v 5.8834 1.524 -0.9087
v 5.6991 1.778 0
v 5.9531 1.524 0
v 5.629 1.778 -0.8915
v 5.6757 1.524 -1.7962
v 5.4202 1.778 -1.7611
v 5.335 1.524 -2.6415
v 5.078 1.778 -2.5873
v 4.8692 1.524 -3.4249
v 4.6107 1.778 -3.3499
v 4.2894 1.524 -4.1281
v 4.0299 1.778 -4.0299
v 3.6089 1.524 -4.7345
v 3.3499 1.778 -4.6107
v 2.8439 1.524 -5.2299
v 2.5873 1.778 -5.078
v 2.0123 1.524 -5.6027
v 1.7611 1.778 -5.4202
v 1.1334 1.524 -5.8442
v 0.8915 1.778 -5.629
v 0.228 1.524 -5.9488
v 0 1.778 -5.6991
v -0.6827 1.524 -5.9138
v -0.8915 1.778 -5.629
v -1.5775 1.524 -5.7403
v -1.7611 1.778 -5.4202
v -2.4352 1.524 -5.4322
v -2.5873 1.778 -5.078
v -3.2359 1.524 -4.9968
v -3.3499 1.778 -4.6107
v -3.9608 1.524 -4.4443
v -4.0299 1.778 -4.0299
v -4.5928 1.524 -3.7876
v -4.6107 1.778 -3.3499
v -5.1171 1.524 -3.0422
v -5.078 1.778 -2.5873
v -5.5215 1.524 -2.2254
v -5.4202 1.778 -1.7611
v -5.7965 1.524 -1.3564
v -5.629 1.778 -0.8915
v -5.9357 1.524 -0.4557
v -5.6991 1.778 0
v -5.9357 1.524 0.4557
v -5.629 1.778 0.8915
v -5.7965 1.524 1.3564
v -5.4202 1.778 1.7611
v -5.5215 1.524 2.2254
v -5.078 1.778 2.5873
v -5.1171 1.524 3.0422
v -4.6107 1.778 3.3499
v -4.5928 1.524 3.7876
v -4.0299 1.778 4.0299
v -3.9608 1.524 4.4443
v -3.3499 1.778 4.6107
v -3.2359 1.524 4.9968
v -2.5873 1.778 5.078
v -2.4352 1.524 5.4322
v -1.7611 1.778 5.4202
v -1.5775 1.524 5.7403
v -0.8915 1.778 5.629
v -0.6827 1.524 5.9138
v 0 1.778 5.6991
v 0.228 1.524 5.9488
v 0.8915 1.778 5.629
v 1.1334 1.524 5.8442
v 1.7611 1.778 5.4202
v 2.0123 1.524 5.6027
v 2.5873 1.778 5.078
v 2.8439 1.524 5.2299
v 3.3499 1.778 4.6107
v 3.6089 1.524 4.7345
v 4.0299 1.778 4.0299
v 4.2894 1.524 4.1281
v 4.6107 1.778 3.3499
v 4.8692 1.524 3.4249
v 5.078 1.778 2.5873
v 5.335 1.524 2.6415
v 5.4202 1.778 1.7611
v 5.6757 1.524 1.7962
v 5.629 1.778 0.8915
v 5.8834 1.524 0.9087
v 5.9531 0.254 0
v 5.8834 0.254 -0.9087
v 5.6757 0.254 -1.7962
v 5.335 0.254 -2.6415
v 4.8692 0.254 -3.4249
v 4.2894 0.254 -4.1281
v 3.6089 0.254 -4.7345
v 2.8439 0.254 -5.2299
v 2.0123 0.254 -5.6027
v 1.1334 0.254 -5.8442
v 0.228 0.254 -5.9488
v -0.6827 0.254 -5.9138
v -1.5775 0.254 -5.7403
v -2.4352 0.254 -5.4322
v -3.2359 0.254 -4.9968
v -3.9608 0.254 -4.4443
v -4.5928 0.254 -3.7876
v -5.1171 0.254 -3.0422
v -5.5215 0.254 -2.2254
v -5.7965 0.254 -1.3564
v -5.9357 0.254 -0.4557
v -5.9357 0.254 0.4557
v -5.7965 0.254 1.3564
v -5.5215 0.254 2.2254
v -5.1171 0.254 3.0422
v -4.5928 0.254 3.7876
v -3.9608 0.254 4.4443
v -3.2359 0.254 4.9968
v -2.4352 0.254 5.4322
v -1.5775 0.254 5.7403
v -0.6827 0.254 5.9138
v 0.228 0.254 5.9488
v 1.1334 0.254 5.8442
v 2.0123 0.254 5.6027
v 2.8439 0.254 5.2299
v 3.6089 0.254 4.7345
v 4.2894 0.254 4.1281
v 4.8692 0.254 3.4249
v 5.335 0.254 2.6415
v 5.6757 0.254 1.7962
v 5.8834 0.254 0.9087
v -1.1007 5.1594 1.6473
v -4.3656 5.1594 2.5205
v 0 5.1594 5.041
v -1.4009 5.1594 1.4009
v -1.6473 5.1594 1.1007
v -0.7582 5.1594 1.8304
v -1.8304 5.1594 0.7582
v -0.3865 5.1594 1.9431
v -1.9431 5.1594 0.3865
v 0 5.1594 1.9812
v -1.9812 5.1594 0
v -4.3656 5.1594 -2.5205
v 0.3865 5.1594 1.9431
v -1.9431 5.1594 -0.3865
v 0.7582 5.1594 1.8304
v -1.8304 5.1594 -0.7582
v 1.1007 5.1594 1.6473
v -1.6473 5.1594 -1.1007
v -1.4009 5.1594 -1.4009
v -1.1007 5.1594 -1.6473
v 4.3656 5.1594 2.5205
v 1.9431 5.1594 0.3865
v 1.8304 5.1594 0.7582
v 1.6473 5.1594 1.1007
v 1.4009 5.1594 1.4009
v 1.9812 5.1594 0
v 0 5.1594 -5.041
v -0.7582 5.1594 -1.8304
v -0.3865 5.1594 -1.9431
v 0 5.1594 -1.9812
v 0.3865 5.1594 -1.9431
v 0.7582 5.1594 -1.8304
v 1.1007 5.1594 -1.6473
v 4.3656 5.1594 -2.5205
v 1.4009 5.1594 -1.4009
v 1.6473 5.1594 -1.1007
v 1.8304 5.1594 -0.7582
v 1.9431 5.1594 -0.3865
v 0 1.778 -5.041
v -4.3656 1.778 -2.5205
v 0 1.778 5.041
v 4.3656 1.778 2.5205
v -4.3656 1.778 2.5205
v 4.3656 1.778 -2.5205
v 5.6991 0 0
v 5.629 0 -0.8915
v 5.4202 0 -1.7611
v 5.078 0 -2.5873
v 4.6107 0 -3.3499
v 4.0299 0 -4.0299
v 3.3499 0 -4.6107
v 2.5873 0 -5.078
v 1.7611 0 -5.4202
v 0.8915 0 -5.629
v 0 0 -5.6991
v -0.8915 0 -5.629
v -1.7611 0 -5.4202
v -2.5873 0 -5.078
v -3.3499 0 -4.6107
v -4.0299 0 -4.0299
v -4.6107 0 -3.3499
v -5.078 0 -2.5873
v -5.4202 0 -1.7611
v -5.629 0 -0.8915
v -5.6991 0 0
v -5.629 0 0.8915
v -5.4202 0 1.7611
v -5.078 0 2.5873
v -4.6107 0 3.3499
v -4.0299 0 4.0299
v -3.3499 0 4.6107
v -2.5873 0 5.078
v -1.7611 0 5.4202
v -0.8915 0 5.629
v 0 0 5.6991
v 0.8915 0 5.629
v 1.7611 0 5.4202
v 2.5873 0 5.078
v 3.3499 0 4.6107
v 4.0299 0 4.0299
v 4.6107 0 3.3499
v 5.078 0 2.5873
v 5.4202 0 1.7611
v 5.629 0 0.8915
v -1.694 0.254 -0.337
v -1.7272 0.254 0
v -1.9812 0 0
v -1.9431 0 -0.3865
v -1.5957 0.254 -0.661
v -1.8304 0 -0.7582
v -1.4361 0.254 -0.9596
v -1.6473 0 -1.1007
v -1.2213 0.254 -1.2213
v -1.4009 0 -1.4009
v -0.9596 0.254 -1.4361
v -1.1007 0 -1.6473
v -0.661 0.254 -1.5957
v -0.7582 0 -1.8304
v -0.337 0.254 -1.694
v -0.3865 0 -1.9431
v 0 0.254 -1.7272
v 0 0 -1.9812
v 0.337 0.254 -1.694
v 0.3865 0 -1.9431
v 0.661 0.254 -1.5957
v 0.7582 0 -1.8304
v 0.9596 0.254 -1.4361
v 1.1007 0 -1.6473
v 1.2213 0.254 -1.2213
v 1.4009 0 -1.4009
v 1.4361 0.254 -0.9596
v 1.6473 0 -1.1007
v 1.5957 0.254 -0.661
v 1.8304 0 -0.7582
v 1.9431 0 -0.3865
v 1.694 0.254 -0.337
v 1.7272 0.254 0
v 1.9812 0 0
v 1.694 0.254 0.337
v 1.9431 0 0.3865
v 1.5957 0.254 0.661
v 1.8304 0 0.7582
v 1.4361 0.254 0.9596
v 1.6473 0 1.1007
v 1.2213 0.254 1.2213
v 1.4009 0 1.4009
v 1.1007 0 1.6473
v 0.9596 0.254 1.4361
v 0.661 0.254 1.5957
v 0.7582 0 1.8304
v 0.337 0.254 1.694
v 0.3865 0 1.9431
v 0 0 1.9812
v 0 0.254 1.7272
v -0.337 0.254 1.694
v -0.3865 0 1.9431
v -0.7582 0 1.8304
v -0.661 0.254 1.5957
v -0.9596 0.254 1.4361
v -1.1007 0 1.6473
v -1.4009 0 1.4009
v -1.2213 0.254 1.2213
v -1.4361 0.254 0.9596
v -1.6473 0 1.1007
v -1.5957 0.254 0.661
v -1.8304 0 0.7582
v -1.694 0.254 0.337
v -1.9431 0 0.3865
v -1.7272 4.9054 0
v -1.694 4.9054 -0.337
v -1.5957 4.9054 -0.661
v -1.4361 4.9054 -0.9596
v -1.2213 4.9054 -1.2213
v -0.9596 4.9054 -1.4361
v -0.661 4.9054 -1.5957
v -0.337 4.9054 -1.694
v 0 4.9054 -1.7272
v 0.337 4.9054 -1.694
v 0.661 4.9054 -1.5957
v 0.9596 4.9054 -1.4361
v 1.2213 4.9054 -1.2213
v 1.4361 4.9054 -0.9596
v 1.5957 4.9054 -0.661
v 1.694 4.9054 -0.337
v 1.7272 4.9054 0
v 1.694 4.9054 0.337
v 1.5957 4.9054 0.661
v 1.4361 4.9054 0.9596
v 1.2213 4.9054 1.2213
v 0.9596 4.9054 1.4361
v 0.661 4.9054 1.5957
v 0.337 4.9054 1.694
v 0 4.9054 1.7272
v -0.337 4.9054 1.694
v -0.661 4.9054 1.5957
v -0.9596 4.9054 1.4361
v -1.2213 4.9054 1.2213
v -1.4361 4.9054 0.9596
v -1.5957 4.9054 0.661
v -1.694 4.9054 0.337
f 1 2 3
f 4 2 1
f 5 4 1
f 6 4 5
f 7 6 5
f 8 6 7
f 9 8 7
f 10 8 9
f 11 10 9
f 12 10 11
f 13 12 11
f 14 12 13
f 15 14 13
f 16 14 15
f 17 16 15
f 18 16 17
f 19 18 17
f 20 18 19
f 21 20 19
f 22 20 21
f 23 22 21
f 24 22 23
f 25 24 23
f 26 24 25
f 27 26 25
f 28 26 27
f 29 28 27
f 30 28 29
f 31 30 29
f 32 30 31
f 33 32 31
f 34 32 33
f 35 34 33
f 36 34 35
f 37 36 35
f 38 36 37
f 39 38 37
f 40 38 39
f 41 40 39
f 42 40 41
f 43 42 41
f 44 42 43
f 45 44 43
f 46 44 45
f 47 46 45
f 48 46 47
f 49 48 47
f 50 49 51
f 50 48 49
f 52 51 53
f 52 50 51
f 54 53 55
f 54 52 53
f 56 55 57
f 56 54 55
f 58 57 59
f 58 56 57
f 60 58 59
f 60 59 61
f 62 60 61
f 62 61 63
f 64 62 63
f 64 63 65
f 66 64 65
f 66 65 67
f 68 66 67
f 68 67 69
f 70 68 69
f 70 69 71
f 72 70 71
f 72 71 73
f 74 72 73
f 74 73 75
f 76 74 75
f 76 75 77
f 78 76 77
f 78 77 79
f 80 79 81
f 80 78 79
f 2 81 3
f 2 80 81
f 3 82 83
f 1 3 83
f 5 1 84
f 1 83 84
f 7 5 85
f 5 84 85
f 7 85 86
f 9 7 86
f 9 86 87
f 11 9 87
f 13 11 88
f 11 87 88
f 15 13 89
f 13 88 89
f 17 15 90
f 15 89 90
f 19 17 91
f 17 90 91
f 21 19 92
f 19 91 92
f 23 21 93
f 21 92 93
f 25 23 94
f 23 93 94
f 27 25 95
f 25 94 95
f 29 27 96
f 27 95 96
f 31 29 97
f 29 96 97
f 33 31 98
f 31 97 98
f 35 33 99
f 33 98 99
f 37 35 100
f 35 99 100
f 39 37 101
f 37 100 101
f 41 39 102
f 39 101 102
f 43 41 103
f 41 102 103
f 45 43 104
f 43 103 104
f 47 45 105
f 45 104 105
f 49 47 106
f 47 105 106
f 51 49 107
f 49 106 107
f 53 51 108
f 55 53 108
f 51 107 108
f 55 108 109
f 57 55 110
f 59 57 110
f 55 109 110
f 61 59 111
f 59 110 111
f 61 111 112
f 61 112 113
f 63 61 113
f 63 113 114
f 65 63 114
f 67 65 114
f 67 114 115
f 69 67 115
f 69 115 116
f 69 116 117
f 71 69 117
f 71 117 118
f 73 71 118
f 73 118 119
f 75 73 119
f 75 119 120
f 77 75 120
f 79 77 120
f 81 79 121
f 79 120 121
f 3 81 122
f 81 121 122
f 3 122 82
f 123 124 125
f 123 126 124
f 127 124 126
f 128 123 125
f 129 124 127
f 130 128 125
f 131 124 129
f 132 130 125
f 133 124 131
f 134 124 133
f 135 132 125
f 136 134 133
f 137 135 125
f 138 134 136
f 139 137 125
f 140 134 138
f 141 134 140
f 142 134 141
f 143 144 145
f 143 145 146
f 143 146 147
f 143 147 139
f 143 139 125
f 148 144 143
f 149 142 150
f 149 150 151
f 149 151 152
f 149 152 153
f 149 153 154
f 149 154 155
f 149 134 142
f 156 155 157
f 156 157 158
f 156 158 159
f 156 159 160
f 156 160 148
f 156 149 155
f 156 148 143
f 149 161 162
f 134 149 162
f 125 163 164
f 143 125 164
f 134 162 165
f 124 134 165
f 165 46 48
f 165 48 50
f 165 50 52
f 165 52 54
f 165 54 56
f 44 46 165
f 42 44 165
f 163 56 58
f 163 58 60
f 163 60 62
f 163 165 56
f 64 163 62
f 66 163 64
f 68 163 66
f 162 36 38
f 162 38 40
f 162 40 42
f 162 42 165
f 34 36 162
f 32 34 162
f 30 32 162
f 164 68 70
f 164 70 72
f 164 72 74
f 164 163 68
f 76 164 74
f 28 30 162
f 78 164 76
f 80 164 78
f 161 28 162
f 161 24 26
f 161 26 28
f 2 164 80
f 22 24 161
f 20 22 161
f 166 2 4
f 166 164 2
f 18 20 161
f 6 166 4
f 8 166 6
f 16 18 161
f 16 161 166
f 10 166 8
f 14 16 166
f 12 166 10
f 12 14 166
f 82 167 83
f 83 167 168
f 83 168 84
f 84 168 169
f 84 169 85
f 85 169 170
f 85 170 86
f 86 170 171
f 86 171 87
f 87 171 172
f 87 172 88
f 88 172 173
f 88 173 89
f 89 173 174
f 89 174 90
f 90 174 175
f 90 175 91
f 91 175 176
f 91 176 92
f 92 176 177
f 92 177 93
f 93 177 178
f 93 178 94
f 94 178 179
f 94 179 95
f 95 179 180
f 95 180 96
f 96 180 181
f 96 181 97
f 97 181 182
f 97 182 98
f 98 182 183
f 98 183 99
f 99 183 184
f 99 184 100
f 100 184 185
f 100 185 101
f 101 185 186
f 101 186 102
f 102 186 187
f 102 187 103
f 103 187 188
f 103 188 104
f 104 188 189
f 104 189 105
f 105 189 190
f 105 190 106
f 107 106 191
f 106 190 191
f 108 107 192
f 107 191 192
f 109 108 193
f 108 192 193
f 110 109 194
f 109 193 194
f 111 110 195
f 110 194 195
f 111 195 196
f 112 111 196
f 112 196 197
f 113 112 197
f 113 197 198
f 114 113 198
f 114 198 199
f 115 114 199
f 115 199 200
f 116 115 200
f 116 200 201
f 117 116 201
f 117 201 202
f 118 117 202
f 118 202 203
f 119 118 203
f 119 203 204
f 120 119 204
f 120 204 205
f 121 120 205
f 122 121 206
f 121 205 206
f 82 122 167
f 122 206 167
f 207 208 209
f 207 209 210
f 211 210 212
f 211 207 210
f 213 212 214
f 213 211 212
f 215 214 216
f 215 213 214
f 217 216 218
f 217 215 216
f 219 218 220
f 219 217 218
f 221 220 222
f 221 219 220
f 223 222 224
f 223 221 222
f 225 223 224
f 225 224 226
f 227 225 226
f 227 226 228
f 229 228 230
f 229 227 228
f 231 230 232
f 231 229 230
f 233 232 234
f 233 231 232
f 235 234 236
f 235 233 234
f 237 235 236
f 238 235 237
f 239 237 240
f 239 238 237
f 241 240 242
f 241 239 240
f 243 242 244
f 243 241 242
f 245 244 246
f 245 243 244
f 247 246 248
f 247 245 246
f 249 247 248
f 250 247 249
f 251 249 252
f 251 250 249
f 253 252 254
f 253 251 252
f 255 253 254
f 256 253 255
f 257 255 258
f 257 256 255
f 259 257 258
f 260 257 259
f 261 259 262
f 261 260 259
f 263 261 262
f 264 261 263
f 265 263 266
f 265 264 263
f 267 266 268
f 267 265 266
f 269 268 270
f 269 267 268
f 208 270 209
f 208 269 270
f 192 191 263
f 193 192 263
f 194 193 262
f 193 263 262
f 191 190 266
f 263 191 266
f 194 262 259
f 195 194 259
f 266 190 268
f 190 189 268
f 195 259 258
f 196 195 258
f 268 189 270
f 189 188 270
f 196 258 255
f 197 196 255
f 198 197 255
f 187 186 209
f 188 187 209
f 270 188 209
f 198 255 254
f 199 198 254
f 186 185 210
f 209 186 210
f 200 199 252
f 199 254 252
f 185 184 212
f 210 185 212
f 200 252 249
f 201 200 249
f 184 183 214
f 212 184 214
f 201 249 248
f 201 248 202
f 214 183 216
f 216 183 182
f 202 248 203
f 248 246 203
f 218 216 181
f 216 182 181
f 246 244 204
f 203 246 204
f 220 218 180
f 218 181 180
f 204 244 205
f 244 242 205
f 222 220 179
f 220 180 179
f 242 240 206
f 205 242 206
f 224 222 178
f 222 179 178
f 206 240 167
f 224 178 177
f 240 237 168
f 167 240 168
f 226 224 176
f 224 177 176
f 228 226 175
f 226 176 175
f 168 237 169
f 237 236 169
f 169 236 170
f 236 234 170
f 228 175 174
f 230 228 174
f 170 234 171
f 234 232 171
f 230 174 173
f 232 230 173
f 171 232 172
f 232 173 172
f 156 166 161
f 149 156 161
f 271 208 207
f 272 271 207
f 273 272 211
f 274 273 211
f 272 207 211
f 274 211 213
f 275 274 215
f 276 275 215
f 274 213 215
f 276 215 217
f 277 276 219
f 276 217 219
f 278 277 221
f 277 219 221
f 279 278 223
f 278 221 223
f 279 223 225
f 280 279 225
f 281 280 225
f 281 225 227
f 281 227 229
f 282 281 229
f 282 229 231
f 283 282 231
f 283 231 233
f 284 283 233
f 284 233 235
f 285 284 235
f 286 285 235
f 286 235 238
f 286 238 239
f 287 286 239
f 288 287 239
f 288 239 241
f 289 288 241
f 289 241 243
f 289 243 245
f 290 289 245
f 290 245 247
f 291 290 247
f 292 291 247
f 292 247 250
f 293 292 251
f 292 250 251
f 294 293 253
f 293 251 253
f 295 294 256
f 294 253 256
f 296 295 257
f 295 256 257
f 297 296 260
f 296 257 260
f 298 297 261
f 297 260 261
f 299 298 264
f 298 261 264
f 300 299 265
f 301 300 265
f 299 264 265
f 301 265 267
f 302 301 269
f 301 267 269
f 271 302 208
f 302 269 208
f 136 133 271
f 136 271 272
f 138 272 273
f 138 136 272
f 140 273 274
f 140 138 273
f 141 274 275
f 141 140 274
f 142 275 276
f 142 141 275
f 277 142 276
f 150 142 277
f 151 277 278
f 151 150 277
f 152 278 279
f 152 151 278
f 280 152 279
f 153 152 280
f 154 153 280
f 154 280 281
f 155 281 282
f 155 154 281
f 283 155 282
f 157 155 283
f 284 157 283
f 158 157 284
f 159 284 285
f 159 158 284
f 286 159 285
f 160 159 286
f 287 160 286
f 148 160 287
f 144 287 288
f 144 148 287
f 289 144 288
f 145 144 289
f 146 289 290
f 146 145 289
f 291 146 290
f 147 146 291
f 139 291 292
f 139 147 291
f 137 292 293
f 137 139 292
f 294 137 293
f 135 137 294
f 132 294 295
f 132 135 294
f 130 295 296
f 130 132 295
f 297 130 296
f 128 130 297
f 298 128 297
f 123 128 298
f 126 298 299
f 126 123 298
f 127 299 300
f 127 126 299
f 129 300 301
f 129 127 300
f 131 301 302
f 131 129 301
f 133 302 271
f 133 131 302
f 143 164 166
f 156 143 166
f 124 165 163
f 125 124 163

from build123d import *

# Parameters (mm, degrees)
SKETCH1_R             = 5.953125
BOSS_EXTRUDE1_DEPTH   = 1.778
BOSS_EXTRUDE2_DEPTH   = 3.381375
F_8_32_TAPPED_HOLE1_D = 3.4544
CHAMFER1_SIZE         = 0.254


with BuildPart() as part:
    # Sketch1 → Boss-Extrude1 (new body)
    with BuildSketch(Plane(origin=(0, 0, 0), x_dir=(1, 0, 0), z_dir=(0, 1, 0))):
        Circle(SKETCH1_R)
    extrude(amount=BOSS_EXTRUDE1_DEPTH)

    # Sketch2 → Boss-Extrude2 (add)
    with BuildSketch(Plane(origin=(0, 1.778, 0), x_dir=(1, 0, 0), z_dir=(0, 1, 0))):
        Polygon((4.365625, -2.520494769), (4.365625, 2.520494769), (0, 5.040989538), (-4.365625, 2.520494769), (-4.365625, -2.520494769), (0, -5.040989538), align=None)
    extrude(amount=BOSS_EXTRUDE2_DEPTH)

    # #8-32 Tapped Hole1 (through all)
    with Locations(Plane(origin=(0, 5.159375, 0), x_dir=(1, 0, 0), z_dir=(0, 1, 0))):
        with Locations((0, 0)):
            Hole(F_8_32_TAPPED_HOLE1_D / 2)

    # Chamfer1
    chamfer1_edges = [part.edges().sort_by_distance(p)[0] for p in [
        (-5.953125, 0, 0),
        (1.7272, 5.159375, 0),
        (1.7272, 0, 0),
        (-5.953125, 1.778, 0),
    ]]
    chamfer(chamfer1_edges, length=CHAMFER1_SIZE)


solid = part.part
